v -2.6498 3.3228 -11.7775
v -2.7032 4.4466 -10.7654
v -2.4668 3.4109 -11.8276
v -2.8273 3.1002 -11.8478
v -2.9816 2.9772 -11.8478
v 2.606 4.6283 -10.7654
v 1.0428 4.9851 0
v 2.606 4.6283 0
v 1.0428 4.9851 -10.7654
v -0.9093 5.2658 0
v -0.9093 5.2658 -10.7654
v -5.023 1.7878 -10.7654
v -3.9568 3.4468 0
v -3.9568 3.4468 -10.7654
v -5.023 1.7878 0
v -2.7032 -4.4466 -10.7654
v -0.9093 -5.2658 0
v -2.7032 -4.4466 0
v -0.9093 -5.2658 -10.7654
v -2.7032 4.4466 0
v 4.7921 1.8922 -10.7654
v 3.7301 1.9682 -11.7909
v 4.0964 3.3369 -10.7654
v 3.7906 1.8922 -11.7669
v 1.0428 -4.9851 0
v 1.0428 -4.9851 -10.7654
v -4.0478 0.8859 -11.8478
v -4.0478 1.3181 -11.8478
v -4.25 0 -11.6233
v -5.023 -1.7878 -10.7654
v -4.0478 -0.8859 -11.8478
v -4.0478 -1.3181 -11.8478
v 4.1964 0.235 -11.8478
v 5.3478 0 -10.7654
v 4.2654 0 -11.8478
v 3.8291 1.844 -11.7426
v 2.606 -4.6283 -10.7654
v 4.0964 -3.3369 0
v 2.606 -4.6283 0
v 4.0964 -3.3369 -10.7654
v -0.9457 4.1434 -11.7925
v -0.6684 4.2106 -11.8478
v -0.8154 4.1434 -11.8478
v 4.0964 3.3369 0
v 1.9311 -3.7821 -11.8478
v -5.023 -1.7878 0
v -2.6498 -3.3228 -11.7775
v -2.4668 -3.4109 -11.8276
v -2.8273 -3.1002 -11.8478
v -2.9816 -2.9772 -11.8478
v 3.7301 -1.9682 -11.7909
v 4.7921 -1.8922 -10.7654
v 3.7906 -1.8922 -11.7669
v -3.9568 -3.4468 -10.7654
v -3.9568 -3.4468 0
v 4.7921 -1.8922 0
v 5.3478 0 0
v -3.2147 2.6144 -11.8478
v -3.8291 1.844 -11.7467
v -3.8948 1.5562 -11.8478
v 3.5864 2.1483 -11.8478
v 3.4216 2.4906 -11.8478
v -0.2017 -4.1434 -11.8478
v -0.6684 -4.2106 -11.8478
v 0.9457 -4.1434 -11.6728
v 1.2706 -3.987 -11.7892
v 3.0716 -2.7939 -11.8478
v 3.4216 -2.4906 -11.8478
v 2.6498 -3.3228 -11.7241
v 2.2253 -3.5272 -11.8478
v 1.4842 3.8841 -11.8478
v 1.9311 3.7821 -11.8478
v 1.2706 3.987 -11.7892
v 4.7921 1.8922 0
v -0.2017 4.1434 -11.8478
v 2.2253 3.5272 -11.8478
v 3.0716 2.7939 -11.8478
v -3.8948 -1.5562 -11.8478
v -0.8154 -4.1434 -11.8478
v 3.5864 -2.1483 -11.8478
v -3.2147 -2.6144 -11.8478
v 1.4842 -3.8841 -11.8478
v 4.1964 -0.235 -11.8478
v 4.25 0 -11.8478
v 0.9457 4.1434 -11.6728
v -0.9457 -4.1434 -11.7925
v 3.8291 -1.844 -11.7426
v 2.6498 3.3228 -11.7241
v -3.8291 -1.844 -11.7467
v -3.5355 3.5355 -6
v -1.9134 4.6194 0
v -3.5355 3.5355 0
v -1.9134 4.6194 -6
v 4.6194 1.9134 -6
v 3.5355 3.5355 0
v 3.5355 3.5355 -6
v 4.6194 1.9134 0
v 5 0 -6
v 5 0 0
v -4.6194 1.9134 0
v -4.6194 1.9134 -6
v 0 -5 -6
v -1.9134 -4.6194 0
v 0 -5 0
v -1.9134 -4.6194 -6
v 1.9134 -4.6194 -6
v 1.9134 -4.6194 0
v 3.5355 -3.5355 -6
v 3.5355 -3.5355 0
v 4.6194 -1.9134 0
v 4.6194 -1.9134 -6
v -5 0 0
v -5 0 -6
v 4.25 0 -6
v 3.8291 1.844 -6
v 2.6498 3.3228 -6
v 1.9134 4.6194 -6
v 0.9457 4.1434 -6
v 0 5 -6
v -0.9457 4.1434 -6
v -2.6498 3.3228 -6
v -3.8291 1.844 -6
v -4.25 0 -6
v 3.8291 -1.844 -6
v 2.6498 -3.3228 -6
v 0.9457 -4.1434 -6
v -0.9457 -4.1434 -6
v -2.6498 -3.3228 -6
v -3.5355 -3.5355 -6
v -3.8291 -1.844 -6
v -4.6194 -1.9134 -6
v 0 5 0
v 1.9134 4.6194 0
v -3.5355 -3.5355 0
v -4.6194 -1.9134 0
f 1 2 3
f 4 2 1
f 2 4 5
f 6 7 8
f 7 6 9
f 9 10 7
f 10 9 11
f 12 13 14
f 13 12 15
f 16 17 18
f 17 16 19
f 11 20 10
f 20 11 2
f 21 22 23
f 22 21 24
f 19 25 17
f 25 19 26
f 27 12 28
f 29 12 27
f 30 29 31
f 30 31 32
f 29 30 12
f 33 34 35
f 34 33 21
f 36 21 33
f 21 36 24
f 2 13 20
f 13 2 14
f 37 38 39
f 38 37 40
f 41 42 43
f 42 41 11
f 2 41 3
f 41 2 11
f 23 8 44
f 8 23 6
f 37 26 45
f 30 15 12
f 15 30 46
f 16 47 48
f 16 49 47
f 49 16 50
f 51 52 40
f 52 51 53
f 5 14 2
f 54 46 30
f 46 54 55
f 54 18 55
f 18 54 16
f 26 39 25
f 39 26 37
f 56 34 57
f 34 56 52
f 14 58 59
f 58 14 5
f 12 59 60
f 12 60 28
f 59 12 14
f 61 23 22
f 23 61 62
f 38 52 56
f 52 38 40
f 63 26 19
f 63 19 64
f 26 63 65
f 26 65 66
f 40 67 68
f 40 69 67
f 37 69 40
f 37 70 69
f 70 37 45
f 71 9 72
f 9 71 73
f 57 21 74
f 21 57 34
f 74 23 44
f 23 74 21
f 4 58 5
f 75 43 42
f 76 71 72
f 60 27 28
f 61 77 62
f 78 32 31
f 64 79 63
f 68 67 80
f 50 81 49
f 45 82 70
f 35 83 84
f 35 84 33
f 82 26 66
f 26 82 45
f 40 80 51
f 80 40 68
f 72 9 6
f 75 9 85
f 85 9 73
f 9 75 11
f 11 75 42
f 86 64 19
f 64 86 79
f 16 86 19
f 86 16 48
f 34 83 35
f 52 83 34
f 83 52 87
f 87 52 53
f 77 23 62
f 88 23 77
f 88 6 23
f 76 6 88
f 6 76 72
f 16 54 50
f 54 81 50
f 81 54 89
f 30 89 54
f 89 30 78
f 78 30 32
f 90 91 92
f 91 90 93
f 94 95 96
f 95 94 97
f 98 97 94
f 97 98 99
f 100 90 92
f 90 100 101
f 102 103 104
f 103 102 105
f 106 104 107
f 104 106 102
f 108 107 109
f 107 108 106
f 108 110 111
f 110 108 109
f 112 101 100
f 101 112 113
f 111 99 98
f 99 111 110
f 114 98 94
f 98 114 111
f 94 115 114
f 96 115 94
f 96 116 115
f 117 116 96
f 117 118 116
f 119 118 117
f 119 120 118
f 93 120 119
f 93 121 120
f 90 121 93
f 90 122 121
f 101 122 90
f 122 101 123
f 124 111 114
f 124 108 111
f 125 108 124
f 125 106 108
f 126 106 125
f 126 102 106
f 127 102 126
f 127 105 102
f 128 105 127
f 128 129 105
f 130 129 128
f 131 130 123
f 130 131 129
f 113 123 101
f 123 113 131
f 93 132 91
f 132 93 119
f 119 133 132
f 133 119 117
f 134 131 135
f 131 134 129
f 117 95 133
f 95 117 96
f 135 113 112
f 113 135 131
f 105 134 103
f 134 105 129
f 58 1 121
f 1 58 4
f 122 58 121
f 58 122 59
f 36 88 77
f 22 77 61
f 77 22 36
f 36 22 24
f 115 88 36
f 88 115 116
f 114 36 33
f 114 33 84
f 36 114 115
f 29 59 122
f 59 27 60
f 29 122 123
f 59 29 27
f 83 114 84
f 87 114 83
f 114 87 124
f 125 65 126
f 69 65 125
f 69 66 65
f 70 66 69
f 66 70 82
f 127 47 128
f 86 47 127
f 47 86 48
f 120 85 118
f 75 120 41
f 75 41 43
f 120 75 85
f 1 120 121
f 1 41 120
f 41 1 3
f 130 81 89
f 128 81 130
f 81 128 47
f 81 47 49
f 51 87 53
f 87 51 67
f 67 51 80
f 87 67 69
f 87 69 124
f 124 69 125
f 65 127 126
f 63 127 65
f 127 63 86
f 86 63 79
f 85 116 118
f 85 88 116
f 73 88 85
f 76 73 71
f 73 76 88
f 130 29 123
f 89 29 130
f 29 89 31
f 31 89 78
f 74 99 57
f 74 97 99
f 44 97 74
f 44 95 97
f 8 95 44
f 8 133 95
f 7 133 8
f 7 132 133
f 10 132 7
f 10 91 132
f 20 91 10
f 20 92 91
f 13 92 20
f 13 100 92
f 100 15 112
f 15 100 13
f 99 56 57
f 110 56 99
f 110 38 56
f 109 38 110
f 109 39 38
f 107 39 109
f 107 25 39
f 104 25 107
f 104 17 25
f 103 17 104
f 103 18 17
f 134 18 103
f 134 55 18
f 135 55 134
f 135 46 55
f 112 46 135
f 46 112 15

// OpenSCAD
//$fn=30;
//for(i=[0:5])
//for(j=[0:5])
//translate([i*20,j*20,0])
intersection(){
difference(){
minkowski(){
cylinder(r=15/2-4,h=24-4,center=true);
sphere(r=2);}
cylinder(r=10/2,h=12,center=true);
cylinder(r=8.5/2,h=100,center=true);
}
translate([0,0,-100])
cube([200,200,200],center=true);
}
